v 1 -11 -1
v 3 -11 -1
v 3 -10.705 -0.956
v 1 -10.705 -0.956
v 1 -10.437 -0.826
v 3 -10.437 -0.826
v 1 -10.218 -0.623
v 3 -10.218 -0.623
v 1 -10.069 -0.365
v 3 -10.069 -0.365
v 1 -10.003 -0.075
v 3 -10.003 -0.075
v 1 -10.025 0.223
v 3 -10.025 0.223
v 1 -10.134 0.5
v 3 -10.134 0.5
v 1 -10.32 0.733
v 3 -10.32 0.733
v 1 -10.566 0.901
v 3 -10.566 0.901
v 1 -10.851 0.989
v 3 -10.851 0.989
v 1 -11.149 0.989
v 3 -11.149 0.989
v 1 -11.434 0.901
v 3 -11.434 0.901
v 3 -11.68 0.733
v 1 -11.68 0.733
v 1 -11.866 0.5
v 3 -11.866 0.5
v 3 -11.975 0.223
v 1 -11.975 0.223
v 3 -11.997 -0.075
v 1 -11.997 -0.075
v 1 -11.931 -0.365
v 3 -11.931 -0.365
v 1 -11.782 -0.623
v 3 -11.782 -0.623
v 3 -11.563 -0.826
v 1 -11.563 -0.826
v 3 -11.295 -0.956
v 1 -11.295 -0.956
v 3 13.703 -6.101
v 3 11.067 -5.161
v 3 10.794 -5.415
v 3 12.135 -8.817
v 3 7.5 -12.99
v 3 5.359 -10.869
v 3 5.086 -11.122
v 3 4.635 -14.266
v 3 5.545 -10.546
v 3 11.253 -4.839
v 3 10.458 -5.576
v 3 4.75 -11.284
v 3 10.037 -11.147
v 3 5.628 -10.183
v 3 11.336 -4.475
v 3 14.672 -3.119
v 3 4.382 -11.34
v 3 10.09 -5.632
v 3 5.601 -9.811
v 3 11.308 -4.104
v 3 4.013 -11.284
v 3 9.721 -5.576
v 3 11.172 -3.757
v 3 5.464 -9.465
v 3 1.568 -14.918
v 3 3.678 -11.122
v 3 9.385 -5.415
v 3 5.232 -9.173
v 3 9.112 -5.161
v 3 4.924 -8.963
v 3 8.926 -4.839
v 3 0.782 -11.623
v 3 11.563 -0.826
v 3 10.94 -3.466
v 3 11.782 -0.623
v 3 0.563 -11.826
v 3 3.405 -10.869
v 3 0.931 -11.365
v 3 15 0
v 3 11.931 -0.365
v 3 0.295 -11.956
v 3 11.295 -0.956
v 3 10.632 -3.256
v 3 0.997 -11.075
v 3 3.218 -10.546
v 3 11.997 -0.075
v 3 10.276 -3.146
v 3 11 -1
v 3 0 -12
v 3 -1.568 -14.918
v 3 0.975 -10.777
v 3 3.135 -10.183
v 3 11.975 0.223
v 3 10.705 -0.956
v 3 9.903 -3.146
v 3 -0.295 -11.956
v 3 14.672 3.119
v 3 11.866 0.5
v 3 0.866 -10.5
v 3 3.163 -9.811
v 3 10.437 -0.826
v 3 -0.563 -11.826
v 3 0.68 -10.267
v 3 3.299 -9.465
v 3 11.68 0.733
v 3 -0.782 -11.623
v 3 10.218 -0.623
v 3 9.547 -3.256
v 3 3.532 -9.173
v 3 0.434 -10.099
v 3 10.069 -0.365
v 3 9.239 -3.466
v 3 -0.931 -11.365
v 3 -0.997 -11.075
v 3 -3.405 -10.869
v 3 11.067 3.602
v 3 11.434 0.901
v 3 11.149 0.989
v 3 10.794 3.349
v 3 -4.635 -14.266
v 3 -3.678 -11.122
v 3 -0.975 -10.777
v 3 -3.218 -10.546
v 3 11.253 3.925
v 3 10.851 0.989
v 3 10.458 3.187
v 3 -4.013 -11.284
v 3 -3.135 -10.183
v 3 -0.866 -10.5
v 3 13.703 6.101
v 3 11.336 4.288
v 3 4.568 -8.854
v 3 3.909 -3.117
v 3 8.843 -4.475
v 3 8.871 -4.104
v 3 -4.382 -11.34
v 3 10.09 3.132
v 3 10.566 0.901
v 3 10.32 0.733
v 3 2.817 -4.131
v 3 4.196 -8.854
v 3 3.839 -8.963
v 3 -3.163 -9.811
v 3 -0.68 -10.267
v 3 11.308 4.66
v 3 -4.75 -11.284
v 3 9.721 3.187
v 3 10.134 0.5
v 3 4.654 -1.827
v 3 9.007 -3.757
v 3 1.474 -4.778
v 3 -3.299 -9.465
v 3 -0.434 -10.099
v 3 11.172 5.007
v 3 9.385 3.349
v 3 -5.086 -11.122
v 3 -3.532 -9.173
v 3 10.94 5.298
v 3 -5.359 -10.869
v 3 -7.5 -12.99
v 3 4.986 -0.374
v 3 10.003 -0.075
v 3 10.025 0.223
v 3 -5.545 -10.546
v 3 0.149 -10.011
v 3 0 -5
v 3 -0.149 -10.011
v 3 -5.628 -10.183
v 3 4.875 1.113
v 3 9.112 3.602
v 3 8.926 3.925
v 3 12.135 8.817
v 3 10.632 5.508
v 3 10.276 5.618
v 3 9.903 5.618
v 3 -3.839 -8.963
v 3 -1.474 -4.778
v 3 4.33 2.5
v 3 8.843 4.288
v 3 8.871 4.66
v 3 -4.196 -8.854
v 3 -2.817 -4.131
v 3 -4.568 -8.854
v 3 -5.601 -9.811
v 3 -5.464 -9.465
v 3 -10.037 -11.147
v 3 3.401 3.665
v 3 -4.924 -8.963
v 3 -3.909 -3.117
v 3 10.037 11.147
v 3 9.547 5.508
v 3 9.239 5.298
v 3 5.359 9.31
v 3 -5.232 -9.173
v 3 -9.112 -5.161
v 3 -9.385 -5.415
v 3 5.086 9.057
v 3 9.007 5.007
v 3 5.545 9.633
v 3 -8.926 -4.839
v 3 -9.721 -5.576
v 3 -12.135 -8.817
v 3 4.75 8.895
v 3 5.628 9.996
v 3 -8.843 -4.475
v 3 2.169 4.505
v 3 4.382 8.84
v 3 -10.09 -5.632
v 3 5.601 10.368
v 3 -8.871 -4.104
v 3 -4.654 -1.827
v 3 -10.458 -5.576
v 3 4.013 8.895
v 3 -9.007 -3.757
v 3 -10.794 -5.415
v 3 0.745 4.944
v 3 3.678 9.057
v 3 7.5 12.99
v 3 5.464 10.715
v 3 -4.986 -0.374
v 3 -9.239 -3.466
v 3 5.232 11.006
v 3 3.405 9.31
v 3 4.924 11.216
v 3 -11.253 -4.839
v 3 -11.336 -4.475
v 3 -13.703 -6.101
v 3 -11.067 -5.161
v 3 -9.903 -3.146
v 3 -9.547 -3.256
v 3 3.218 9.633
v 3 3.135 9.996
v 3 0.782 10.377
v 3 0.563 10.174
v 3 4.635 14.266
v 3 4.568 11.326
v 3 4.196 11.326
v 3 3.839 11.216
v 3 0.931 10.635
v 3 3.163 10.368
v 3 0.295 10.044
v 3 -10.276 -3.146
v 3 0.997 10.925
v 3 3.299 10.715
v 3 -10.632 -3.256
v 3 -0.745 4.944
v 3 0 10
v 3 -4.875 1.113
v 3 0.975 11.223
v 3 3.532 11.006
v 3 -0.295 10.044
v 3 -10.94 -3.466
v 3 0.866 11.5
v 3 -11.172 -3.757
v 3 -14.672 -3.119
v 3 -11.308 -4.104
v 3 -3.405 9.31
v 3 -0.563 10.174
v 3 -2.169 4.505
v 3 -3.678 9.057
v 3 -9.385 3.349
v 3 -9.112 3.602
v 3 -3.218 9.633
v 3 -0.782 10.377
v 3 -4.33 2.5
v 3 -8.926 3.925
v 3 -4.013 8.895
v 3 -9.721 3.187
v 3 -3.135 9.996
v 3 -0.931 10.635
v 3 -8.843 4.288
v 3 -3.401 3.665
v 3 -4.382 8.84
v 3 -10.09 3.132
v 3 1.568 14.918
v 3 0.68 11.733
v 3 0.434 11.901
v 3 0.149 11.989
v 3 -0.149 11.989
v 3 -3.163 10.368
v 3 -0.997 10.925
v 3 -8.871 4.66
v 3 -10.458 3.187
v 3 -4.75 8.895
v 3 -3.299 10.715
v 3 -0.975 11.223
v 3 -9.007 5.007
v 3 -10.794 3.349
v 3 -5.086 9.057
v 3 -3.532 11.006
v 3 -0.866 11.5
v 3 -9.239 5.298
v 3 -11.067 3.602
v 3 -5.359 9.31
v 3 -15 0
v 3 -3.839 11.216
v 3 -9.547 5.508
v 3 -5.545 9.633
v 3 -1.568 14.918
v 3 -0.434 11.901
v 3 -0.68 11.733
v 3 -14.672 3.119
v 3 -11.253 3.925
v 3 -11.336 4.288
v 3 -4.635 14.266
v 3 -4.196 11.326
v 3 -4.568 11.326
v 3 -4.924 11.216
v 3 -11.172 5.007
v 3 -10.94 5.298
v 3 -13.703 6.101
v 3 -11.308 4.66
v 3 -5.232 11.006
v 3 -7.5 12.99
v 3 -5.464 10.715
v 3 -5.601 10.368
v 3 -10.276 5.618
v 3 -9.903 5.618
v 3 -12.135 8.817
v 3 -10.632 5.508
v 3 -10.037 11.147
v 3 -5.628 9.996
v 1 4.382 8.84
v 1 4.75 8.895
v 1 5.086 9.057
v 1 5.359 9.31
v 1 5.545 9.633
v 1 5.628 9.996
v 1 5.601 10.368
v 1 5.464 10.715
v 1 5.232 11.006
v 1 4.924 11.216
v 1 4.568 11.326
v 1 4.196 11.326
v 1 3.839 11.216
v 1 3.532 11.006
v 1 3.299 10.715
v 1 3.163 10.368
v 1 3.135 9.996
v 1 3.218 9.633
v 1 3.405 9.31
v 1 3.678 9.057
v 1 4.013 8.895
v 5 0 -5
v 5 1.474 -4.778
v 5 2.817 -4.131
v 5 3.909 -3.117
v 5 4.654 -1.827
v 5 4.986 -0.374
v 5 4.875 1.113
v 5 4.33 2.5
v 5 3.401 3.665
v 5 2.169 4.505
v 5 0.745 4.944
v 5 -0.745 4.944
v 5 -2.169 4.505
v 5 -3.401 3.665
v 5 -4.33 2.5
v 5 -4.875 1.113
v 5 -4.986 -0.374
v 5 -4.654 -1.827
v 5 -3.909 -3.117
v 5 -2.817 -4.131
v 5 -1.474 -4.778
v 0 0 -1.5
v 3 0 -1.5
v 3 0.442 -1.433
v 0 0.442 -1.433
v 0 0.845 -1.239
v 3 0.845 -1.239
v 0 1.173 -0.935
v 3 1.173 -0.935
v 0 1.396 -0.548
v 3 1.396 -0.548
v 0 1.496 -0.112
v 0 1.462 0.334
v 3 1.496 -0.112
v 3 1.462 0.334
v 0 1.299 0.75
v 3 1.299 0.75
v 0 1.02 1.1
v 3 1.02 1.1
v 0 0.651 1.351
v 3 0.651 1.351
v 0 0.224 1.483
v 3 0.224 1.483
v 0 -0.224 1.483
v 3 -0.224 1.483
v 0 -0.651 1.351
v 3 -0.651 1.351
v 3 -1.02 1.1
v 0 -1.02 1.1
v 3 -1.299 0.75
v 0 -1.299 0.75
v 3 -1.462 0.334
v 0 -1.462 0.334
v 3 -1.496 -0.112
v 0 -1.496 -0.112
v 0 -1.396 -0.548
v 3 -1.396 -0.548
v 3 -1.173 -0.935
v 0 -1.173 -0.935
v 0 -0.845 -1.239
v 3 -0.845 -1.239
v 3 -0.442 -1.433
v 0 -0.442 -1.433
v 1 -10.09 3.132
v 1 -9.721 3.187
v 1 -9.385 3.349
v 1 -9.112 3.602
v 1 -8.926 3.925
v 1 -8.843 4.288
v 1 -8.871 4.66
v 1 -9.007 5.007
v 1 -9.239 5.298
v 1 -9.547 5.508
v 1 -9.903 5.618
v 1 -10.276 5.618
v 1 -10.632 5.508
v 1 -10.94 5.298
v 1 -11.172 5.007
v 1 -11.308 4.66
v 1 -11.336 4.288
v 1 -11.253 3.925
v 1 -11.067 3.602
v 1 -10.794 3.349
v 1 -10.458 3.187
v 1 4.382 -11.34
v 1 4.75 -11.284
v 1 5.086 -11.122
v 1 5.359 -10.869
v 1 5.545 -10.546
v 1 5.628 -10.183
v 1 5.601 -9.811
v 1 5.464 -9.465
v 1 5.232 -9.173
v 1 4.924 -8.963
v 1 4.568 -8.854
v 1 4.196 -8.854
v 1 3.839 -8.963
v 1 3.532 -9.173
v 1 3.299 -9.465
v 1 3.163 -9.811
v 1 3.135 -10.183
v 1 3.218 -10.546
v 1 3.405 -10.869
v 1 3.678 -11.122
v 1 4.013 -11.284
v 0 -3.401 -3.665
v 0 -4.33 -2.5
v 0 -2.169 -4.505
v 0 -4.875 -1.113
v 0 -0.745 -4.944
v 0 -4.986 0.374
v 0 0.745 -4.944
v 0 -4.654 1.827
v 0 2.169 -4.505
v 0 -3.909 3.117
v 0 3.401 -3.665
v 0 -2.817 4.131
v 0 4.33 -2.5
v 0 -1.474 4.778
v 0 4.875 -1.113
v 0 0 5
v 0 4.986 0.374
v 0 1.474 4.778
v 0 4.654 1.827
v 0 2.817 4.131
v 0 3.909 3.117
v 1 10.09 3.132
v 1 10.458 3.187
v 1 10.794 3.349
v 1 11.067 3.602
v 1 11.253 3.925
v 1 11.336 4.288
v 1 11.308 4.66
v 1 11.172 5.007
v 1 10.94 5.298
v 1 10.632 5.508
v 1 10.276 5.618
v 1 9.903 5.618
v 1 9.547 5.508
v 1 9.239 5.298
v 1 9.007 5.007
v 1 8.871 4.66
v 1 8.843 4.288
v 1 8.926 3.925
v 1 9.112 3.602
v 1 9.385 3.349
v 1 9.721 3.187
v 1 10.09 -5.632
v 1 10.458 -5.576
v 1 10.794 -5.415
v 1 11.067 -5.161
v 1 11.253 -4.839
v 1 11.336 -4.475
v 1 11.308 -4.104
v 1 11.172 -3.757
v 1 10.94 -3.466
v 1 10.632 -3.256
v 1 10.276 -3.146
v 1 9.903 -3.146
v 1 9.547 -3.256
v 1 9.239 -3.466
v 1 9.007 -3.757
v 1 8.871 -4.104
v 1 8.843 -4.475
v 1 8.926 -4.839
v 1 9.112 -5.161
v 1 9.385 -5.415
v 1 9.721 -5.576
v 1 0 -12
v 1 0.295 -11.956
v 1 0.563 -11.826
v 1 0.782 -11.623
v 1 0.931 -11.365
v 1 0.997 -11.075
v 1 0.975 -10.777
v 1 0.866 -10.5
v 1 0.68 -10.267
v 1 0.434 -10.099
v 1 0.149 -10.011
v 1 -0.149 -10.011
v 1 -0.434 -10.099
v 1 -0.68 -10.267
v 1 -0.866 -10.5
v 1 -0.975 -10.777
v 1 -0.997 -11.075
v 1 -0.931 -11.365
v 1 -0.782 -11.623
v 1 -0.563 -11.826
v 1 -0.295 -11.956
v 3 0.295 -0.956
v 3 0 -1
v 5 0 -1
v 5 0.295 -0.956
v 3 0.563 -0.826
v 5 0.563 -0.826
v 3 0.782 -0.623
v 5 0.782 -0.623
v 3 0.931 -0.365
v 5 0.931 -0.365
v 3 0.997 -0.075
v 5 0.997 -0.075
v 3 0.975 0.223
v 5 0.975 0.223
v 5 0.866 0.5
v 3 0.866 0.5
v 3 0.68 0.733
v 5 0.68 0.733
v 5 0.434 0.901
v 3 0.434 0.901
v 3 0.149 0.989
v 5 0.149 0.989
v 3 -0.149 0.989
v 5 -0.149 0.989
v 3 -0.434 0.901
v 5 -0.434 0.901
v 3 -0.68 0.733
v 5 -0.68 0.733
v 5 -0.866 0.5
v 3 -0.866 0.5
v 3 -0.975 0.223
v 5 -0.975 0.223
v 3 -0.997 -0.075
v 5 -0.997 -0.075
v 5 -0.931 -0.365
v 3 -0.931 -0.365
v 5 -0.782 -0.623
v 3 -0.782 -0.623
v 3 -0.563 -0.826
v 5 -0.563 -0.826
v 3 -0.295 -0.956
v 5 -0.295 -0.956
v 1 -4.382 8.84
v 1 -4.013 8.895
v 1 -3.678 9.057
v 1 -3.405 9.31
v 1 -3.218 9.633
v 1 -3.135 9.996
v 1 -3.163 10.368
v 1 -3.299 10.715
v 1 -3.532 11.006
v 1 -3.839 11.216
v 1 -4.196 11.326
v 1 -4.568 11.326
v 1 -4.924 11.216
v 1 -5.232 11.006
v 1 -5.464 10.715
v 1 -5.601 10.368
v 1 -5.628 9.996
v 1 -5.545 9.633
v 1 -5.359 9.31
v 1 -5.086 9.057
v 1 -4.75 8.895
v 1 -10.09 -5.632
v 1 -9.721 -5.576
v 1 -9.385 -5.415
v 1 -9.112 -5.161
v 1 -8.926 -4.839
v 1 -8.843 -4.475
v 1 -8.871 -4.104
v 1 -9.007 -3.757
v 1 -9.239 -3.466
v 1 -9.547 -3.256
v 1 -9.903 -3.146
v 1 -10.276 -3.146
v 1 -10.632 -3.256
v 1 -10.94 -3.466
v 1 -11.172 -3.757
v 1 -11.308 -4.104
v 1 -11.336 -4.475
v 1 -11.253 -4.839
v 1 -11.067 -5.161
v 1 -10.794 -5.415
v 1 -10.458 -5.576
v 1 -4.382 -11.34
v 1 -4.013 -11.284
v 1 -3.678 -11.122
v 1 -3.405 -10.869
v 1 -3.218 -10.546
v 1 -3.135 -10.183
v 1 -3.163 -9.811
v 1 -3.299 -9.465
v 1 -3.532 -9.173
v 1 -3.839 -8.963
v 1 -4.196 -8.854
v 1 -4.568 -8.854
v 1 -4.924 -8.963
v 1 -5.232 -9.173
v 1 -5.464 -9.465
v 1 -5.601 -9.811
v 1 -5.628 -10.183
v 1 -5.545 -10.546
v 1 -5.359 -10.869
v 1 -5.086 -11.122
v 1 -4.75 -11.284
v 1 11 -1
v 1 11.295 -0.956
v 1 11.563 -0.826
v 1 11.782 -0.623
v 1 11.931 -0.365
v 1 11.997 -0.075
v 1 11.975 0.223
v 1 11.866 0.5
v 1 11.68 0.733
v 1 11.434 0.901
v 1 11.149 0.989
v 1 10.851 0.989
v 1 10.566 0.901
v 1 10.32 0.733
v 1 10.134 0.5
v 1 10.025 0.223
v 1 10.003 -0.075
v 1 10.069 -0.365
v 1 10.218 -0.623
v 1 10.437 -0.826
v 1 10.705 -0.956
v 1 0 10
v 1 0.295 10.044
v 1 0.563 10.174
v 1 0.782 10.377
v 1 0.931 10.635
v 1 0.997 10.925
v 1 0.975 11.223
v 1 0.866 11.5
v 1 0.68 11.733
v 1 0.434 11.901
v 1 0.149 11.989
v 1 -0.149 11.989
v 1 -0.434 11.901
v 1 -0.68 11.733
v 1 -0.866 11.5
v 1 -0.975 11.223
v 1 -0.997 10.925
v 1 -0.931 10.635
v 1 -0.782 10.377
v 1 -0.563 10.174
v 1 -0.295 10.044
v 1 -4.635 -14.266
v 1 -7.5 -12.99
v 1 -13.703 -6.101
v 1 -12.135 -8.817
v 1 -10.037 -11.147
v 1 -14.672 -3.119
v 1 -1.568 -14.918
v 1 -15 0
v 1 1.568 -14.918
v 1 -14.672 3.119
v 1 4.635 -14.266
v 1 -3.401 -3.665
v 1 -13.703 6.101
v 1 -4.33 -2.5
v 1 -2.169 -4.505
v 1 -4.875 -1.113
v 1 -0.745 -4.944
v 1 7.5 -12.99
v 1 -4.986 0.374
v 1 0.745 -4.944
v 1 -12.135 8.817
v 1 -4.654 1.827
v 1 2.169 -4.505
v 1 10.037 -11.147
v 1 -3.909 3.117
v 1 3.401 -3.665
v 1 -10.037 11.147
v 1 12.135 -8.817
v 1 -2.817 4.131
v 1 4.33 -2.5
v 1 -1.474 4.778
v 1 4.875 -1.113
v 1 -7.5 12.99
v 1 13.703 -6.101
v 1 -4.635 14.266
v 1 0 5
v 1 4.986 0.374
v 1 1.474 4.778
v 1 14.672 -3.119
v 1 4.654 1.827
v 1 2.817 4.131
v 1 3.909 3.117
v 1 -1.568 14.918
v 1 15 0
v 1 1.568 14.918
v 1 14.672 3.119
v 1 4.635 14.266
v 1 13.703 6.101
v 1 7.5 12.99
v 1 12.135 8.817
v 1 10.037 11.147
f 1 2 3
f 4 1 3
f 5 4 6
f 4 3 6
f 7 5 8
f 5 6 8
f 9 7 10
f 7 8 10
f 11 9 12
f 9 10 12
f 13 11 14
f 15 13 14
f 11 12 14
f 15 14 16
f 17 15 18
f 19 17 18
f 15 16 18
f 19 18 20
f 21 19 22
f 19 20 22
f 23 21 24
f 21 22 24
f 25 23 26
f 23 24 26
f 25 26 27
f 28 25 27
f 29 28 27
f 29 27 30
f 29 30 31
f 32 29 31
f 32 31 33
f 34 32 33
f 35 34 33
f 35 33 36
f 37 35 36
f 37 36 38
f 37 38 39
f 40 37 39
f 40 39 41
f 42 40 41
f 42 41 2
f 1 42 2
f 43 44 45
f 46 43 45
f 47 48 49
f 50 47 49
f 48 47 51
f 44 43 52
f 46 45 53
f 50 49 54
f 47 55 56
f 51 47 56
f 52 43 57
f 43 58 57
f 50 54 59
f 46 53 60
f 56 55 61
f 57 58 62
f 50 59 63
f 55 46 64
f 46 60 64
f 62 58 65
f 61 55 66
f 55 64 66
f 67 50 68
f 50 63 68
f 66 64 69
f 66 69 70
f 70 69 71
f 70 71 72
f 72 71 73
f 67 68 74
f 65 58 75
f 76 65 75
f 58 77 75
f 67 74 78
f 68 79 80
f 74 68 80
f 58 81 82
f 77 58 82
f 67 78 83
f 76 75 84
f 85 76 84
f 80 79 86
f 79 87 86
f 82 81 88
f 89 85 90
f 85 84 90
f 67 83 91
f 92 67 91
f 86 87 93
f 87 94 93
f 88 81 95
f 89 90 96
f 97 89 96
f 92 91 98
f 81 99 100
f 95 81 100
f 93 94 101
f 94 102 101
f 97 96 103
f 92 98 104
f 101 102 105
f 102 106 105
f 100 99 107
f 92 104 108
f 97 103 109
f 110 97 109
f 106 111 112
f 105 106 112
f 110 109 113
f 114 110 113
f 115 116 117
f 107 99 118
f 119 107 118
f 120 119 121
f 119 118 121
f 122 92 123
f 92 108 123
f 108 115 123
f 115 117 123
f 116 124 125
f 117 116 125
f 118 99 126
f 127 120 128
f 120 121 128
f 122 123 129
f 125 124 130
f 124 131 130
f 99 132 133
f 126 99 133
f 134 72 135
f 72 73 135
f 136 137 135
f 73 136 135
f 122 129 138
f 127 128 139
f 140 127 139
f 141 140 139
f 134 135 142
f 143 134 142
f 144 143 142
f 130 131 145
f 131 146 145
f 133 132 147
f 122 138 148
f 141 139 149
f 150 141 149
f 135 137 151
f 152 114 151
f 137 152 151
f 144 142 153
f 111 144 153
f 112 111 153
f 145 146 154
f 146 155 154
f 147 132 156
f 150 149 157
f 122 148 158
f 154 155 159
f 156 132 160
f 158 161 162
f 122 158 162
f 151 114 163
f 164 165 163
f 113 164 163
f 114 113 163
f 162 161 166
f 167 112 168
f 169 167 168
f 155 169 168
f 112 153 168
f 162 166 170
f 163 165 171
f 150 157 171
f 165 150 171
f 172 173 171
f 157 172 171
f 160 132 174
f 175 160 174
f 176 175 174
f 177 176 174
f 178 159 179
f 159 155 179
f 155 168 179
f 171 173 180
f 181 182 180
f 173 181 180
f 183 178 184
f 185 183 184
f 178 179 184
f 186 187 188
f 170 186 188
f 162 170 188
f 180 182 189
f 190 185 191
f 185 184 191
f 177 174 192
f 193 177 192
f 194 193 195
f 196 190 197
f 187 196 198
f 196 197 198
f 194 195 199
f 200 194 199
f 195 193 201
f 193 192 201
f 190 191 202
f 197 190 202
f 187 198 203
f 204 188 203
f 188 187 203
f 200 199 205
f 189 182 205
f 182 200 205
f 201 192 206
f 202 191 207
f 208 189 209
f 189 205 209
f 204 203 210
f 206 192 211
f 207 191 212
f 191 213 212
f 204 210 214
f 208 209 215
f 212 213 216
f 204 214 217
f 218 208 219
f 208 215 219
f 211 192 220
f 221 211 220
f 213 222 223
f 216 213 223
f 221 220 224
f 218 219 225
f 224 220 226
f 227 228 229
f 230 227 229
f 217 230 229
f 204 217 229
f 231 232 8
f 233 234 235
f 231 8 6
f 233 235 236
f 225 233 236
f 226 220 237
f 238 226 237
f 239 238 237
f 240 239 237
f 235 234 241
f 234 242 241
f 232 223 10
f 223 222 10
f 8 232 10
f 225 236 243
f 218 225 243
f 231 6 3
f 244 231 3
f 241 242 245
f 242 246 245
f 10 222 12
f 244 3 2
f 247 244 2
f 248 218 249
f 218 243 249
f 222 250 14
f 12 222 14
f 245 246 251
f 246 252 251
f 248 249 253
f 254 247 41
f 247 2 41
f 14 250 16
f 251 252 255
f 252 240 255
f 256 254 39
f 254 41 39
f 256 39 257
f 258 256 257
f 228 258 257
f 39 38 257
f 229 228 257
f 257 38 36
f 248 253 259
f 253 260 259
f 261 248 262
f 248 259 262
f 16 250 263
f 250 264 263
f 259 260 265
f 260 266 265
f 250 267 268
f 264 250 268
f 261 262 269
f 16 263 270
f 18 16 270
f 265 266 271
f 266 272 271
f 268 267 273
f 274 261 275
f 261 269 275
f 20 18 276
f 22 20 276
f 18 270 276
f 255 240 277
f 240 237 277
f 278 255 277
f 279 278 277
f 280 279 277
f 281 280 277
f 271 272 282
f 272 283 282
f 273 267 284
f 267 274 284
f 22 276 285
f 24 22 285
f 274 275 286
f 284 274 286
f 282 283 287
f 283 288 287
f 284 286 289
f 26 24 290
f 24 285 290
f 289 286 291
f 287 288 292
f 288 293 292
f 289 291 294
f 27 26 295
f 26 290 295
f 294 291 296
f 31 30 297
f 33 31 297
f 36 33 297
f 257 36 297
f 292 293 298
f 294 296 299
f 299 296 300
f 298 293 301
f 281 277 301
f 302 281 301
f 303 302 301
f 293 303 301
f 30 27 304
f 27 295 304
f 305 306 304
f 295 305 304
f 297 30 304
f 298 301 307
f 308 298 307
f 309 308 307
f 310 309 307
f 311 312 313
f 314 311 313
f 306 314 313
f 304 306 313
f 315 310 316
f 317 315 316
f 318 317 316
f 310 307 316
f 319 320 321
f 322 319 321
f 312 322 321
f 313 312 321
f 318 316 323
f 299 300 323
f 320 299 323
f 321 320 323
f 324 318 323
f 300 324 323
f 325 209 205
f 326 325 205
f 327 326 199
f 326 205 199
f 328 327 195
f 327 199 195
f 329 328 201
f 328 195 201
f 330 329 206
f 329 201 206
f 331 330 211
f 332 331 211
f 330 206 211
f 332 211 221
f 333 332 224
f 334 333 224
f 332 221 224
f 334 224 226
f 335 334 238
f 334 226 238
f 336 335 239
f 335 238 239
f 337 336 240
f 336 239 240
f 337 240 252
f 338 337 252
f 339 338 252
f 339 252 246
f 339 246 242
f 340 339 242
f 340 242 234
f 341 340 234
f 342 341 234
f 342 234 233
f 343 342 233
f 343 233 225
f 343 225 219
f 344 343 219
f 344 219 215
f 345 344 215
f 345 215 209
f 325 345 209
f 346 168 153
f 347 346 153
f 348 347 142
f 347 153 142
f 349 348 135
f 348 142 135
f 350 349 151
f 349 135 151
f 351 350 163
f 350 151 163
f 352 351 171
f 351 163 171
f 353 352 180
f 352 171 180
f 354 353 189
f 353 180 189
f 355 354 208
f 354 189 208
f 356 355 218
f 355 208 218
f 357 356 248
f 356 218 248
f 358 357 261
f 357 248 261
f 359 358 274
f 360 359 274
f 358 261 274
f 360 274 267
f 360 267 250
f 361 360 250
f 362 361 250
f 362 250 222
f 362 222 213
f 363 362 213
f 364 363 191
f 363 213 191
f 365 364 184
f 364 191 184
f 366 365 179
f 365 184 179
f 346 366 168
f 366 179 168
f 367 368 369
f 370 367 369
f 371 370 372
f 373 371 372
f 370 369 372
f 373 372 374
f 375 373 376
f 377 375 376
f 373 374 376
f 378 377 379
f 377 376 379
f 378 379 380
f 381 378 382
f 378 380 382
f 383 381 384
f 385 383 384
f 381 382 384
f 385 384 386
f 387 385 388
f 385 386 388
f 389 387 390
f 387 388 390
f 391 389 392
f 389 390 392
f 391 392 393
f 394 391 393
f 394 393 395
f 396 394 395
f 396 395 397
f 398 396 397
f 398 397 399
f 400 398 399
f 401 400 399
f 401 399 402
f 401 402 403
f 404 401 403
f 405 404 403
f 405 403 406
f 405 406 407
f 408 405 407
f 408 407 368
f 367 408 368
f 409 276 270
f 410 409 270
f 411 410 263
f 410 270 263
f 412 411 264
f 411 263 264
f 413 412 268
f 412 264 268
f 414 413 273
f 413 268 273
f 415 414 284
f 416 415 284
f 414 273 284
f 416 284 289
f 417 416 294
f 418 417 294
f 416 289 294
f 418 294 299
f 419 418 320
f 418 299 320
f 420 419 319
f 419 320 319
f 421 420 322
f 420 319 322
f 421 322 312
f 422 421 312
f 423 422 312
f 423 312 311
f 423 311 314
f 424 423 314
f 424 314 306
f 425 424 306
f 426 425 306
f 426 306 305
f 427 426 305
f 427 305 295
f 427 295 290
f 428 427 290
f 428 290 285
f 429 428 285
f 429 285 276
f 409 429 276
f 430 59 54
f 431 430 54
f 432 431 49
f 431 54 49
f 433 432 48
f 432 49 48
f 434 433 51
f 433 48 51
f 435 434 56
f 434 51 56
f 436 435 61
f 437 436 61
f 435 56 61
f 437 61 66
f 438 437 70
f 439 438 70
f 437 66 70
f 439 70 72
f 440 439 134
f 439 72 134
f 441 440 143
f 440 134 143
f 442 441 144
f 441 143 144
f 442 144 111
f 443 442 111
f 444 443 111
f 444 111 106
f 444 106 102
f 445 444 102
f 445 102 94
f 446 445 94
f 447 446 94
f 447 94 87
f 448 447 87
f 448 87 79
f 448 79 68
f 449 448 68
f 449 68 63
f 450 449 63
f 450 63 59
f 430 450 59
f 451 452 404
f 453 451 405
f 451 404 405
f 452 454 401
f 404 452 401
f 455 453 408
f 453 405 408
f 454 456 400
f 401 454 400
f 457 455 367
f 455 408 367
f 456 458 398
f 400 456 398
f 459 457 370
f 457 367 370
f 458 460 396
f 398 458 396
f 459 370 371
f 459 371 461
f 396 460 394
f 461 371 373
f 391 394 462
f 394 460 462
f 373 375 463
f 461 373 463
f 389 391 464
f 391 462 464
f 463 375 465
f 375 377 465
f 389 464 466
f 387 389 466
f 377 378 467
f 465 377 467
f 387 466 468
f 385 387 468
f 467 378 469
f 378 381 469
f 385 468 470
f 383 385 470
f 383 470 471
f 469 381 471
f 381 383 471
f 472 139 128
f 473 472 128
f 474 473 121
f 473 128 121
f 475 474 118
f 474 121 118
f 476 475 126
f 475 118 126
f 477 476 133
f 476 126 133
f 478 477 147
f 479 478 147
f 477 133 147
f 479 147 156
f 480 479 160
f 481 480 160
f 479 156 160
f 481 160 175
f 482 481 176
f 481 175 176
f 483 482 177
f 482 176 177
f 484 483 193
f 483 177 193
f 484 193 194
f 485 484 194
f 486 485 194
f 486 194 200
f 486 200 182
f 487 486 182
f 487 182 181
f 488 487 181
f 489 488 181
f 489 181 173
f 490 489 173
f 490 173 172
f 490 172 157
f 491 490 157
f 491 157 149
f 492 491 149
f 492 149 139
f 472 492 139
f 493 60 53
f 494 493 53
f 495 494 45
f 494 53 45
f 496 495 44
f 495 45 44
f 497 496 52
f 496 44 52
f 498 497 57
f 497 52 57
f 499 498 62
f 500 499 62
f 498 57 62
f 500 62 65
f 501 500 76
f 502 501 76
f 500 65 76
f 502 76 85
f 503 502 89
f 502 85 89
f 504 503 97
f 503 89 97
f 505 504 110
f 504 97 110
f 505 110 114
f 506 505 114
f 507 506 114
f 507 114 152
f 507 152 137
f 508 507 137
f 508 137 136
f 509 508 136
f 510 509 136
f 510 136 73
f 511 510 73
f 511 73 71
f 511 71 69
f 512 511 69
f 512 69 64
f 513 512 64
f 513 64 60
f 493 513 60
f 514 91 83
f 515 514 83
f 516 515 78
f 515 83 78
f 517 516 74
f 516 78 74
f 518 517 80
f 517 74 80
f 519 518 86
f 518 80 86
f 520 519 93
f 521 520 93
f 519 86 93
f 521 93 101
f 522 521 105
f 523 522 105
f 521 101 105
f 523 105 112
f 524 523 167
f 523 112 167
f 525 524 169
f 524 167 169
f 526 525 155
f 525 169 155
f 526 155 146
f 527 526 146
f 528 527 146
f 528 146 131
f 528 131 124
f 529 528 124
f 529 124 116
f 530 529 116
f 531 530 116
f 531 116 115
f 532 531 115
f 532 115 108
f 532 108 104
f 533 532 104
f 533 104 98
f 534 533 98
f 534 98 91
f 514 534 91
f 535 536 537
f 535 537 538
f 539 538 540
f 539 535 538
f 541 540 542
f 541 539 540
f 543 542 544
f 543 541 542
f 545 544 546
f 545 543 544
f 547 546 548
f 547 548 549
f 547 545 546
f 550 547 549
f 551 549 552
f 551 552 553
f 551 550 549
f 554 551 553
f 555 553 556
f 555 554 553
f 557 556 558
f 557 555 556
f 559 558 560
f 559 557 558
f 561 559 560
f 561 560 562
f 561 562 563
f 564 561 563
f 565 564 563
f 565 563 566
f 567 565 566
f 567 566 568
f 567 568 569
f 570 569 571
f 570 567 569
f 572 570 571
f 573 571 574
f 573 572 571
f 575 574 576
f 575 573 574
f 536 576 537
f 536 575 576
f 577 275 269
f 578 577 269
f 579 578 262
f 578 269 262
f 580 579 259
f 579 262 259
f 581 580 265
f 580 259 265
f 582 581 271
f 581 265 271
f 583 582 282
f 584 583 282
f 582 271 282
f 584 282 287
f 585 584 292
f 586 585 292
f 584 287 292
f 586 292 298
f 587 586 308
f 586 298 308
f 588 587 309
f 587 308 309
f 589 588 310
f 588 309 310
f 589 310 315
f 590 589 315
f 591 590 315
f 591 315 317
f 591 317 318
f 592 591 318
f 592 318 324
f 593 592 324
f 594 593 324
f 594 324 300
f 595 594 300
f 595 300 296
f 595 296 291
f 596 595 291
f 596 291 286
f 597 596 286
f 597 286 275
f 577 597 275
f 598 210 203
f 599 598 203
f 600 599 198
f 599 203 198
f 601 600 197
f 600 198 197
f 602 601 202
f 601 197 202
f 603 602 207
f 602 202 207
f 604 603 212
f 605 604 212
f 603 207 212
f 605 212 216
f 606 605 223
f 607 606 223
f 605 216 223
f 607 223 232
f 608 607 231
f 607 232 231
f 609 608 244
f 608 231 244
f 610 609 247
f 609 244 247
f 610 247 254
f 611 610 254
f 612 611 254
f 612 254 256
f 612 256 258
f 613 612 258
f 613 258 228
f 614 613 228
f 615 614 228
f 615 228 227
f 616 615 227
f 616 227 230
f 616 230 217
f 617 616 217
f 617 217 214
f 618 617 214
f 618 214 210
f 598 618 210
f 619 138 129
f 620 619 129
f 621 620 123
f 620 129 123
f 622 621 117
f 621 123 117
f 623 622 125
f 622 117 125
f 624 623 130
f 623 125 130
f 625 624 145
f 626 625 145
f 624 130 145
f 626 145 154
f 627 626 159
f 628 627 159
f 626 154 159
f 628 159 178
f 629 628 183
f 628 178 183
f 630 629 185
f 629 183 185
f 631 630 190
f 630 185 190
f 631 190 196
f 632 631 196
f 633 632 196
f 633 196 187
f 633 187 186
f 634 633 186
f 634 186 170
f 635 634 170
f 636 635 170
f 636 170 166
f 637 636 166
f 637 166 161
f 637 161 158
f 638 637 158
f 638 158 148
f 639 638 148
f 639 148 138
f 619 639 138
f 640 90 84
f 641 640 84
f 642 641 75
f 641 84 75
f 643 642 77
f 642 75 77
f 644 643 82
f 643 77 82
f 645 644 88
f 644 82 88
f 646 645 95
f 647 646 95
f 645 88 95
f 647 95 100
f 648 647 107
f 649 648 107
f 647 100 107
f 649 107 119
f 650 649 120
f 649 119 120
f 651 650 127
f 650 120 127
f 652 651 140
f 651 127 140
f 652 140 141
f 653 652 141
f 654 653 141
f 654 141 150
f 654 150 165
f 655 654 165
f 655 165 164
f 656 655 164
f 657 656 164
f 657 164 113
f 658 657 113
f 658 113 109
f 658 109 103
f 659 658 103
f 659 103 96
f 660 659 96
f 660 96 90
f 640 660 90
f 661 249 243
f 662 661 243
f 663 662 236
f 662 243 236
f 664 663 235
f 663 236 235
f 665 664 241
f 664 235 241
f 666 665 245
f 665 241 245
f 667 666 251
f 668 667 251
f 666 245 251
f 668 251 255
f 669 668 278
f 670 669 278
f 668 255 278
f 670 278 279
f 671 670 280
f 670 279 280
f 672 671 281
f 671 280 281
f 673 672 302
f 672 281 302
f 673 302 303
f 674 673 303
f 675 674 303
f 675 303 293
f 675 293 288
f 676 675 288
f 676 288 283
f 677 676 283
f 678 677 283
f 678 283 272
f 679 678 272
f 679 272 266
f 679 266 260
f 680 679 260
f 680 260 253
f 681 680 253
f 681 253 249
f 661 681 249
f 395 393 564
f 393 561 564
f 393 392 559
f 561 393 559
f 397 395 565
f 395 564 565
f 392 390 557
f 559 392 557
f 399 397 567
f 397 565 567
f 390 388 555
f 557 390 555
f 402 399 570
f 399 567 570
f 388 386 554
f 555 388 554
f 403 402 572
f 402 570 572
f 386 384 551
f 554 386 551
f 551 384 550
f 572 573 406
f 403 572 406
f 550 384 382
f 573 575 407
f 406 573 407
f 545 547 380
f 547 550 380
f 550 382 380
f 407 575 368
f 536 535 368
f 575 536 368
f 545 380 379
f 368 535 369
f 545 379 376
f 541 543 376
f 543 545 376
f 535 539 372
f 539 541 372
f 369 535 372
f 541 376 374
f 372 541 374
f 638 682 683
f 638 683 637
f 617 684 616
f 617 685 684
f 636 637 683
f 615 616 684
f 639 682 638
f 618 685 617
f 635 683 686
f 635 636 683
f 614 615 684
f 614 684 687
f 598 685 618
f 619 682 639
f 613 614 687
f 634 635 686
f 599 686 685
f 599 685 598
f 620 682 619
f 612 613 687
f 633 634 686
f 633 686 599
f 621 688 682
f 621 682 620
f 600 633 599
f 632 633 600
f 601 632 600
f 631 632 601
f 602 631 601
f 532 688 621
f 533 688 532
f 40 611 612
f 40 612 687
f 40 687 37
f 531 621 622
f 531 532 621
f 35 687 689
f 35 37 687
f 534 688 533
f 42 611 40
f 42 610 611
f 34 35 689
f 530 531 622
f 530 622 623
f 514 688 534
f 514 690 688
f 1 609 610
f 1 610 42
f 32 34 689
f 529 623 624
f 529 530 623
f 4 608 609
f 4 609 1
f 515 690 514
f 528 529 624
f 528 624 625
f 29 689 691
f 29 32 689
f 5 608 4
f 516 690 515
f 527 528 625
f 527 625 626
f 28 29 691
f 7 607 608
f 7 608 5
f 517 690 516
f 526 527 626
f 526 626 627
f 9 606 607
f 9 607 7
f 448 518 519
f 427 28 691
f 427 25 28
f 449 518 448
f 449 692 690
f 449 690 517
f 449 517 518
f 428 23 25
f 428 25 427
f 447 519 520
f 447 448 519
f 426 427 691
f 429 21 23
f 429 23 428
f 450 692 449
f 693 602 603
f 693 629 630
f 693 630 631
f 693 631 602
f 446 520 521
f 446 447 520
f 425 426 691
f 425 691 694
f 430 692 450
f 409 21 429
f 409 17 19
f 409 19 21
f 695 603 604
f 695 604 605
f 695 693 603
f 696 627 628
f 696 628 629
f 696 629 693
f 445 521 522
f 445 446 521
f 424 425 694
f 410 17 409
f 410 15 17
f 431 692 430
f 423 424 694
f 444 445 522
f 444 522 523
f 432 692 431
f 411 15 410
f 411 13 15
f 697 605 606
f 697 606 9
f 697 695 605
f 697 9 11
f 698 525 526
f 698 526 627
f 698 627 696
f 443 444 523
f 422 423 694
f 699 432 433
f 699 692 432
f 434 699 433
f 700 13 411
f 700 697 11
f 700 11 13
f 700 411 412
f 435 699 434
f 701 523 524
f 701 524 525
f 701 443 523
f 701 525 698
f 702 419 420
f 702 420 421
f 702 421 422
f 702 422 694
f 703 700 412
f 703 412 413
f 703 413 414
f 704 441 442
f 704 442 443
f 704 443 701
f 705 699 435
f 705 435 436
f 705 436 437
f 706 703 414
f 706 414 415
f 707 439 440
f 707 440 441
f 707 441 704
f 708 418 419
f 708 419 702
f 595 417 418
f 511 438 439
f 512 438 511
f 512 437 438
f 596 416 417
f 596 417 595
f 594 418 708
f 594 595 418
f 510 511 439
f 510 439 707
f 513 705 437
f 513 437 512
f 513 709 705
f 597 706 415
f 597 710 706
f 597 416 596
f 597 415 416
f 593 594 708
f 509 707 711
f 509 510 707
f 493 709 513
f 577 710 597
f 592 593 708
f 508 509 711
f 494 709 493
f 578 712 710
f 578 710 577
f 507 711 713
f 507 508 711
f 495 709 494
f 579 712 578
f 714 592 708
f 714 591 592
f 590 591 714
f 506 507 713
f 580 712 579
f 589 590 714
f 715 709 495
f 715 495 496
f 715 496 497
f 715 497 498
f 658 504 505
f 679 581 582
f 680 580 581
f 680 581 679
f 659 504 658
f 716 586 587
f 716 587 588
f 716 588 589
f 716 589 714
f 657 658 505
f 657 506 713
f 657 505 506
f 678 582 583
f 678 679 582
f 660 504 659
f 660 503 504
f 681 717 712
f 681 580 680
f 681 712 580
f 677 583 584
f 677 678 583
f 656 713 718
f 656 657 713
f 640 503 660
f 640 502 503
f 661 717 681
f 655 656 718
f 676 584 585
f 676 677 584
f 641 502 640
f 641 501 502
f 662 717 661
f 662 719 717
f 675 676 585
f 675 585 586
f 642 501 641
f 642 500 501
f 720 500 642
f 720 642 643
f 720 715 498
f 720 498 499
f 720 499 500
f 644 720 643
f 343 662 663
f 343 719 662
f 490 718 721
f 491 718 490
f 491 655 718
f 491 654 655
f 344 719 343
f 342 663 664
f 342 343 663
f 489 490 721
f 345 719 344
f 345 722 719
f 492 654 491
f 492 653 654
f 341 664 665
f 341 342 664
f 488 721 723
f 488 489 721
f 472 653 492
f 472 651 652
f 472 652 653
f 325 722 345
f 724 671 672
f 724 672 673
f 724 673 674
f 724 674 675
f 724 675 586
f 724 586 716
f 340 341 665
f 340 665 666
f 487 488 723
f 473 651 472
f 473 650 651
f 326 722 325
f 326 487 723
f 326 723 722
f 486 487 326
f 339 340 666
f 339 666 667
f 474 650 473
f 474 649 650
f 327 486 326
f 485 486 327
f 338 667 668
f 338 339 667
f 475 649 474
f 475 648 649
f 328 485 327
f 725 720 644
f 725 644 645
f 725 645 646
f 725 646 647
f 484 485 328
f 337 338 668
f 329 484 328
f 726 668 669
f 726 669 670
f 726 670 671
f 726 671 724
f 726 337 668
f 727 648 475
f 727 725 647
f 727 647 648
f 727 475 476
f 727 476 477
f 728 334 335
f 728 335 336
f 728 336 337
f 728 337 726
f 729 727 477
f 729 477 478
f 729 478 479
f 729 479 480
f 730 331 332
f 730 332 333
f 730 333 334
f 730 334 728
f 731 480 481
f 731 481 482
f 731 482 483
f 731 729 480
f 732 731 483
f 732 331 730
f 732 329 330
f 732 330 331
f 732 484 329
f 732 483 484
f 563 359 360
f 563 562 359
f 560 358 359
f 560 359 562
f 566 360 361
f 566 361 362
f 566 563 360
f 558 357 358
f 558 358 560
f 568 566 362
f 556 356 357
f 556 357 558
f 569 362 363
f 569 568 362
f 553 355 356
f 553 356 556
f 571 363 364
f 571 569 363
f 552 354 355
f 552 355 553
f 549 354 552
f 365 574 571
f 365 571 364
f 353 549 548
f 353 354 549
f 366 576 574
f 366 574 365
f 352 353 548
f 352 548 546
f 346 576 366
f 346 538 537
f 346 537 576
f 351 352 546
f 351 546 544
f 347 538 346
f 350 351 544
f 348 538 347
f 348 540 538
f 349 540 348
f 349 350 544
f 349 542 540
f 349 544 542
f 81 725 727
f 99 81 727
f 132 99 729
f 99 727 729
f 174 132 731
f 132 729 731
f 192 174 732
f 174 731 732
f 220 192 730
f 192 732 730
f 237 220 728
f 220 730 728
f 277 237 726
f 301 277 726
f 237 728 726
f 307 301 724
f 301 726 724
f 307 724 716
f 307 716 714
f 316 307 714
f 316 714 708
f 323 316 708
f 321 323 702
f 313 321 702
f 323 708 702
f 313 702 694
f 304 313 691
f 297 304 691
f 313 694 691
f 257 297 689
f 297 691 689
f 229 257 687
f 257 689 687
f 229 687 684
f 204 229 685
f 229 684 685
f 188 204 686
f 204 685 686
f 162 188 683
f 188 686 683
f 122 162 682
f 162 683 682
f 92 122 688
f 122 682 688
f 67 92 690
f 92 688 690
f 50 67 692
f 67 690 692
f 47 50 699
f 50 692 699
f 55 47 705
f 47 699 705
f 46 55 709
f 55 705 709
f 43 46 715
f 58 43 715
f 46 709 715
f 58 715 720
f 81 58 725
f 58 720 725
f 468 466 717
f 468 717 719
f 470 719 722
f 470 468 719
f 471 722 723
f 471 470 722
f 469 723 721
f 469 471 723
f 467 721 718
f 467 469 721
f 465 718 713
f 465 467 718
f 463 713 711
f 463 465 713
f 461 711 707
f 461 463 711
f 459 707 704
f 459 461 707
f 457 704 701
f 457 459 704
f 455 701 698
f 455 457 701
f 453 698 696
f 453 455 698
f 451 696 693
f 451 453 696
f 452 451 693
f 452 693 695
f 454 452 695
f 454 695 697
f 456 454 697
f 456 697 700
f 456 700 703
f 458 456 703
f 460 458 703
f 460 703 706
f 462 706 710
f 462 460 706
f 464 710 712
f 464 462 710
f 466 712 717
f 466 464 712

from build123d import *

# Parameters (mm, degrees)
SKETCH3_R           = 1.5
EXTRUDE1_DEPTH      = 4
SKETCH4_R           = 1
SKETCH4_R_2         = 1.25
EXTRUDE2_DEPTH      = 4
SKETCH5_R           = 5
SKETCH5_R_2         = 1
BOSS_EXTRUDE1_DEPTH = 2
SKETCH6_R           = 15
SKETCH6_R_2         = 5
CUT_EXTRUDE2_DEPTH  = 1


with BuildPart() as part:
    # Sketch1 → Revolve1 (revolve)
    with BuildSketch(Plane.XY):
        Polygon((1.809375, 15), (1.190625, 15), (0, 15), (0, 14), (0, 0), (3, 0), (3, 14), (3, 15), align=None)
    revolve(axis=Axis((0, 0, 0), (1, 0, 0)))

    # Sketch3 → Extrude1 (cut, through all)
    with BuildSketch(Plane(origin=(3, 0, 0), x_dir=(0, 0, -1), z_dir=(1, 0, 0))):
        Circle(SKETCH3_R)
    extrude(amount=-EXTRUDE1_DEPTH, mode=Mode.SUBTRACT)

    # Sketch4 → Extrude2 (cut, through all)
    with BuildSketch(Plane(origin=(3, 0, 0), x_dir=(0, 0, -1), z_dir=(1, 0, 0))):
        with Locations((0, 11)):
            Circle(SKETCH4_R)
        with Locations((-4.381841494, 10.089572098)):
            Circle(SKETCH4_R_2)
        with Locations((4.381841494, 10.089572098)):
            Circle(SKETCH4_R_2)
        with Locations((10.089572098, -4.381841494)):
            Circle(SKETCH4_R_2)
        with Locations((11, 0)):
            Circle(SKETCH4_R)
        with Locations((10.089572098, 4.381841494)):
            Circle(SKETCH4_R_2)
        with Locations((-4.381841494, -10.089572098)):
            Circle(SKETCH4_R_2)
        with Locations((0, -11)):
            Circle(SKETCH4_R)
        with Locations((4.381841494, -10.089572098)):
            Circle(SKETCH4_R_2)
        with Locations((-10.089572098, 4.381841494)):
            Circle(SKETCH4_R_2)
        with Locations((-11, 0)):
            Circle(SKETCH4_R)
        with Locations((-10.089572098, -4.381841494)):
            Circle(SKETCH4_R_2)
    extrude(amount=-EXTRUDE2_DEPTH, mode=Mode.SUBTRACT)

    # Sketch5 → Boss-Extrude1 (add)
    with BuildSketch(Plane(origin=(3, 0, 0), x_dir=(0, 0, -1), z_dir=(1, 0, 0))):
        Circle(SKETCH5_R)
        Circle(SKETCH5_R_2, mode=Mode.SUBTRACT)
    extrude(amount=BOSS_EXTRUDE1_DEPTH)

    # Sketch6 → Cut-Extrude2 (cut)
    with BuildSketch(Plane.ZY):
        Circle(SKETCH6_R)
        Circle(SKETCH6_R_2, mode=Mode.SUBTRACT)
    extrude(amount=-CUT_EXTRUDE2_DEPTH, mode=Mode.SUBTRACT)


solid = part.part
